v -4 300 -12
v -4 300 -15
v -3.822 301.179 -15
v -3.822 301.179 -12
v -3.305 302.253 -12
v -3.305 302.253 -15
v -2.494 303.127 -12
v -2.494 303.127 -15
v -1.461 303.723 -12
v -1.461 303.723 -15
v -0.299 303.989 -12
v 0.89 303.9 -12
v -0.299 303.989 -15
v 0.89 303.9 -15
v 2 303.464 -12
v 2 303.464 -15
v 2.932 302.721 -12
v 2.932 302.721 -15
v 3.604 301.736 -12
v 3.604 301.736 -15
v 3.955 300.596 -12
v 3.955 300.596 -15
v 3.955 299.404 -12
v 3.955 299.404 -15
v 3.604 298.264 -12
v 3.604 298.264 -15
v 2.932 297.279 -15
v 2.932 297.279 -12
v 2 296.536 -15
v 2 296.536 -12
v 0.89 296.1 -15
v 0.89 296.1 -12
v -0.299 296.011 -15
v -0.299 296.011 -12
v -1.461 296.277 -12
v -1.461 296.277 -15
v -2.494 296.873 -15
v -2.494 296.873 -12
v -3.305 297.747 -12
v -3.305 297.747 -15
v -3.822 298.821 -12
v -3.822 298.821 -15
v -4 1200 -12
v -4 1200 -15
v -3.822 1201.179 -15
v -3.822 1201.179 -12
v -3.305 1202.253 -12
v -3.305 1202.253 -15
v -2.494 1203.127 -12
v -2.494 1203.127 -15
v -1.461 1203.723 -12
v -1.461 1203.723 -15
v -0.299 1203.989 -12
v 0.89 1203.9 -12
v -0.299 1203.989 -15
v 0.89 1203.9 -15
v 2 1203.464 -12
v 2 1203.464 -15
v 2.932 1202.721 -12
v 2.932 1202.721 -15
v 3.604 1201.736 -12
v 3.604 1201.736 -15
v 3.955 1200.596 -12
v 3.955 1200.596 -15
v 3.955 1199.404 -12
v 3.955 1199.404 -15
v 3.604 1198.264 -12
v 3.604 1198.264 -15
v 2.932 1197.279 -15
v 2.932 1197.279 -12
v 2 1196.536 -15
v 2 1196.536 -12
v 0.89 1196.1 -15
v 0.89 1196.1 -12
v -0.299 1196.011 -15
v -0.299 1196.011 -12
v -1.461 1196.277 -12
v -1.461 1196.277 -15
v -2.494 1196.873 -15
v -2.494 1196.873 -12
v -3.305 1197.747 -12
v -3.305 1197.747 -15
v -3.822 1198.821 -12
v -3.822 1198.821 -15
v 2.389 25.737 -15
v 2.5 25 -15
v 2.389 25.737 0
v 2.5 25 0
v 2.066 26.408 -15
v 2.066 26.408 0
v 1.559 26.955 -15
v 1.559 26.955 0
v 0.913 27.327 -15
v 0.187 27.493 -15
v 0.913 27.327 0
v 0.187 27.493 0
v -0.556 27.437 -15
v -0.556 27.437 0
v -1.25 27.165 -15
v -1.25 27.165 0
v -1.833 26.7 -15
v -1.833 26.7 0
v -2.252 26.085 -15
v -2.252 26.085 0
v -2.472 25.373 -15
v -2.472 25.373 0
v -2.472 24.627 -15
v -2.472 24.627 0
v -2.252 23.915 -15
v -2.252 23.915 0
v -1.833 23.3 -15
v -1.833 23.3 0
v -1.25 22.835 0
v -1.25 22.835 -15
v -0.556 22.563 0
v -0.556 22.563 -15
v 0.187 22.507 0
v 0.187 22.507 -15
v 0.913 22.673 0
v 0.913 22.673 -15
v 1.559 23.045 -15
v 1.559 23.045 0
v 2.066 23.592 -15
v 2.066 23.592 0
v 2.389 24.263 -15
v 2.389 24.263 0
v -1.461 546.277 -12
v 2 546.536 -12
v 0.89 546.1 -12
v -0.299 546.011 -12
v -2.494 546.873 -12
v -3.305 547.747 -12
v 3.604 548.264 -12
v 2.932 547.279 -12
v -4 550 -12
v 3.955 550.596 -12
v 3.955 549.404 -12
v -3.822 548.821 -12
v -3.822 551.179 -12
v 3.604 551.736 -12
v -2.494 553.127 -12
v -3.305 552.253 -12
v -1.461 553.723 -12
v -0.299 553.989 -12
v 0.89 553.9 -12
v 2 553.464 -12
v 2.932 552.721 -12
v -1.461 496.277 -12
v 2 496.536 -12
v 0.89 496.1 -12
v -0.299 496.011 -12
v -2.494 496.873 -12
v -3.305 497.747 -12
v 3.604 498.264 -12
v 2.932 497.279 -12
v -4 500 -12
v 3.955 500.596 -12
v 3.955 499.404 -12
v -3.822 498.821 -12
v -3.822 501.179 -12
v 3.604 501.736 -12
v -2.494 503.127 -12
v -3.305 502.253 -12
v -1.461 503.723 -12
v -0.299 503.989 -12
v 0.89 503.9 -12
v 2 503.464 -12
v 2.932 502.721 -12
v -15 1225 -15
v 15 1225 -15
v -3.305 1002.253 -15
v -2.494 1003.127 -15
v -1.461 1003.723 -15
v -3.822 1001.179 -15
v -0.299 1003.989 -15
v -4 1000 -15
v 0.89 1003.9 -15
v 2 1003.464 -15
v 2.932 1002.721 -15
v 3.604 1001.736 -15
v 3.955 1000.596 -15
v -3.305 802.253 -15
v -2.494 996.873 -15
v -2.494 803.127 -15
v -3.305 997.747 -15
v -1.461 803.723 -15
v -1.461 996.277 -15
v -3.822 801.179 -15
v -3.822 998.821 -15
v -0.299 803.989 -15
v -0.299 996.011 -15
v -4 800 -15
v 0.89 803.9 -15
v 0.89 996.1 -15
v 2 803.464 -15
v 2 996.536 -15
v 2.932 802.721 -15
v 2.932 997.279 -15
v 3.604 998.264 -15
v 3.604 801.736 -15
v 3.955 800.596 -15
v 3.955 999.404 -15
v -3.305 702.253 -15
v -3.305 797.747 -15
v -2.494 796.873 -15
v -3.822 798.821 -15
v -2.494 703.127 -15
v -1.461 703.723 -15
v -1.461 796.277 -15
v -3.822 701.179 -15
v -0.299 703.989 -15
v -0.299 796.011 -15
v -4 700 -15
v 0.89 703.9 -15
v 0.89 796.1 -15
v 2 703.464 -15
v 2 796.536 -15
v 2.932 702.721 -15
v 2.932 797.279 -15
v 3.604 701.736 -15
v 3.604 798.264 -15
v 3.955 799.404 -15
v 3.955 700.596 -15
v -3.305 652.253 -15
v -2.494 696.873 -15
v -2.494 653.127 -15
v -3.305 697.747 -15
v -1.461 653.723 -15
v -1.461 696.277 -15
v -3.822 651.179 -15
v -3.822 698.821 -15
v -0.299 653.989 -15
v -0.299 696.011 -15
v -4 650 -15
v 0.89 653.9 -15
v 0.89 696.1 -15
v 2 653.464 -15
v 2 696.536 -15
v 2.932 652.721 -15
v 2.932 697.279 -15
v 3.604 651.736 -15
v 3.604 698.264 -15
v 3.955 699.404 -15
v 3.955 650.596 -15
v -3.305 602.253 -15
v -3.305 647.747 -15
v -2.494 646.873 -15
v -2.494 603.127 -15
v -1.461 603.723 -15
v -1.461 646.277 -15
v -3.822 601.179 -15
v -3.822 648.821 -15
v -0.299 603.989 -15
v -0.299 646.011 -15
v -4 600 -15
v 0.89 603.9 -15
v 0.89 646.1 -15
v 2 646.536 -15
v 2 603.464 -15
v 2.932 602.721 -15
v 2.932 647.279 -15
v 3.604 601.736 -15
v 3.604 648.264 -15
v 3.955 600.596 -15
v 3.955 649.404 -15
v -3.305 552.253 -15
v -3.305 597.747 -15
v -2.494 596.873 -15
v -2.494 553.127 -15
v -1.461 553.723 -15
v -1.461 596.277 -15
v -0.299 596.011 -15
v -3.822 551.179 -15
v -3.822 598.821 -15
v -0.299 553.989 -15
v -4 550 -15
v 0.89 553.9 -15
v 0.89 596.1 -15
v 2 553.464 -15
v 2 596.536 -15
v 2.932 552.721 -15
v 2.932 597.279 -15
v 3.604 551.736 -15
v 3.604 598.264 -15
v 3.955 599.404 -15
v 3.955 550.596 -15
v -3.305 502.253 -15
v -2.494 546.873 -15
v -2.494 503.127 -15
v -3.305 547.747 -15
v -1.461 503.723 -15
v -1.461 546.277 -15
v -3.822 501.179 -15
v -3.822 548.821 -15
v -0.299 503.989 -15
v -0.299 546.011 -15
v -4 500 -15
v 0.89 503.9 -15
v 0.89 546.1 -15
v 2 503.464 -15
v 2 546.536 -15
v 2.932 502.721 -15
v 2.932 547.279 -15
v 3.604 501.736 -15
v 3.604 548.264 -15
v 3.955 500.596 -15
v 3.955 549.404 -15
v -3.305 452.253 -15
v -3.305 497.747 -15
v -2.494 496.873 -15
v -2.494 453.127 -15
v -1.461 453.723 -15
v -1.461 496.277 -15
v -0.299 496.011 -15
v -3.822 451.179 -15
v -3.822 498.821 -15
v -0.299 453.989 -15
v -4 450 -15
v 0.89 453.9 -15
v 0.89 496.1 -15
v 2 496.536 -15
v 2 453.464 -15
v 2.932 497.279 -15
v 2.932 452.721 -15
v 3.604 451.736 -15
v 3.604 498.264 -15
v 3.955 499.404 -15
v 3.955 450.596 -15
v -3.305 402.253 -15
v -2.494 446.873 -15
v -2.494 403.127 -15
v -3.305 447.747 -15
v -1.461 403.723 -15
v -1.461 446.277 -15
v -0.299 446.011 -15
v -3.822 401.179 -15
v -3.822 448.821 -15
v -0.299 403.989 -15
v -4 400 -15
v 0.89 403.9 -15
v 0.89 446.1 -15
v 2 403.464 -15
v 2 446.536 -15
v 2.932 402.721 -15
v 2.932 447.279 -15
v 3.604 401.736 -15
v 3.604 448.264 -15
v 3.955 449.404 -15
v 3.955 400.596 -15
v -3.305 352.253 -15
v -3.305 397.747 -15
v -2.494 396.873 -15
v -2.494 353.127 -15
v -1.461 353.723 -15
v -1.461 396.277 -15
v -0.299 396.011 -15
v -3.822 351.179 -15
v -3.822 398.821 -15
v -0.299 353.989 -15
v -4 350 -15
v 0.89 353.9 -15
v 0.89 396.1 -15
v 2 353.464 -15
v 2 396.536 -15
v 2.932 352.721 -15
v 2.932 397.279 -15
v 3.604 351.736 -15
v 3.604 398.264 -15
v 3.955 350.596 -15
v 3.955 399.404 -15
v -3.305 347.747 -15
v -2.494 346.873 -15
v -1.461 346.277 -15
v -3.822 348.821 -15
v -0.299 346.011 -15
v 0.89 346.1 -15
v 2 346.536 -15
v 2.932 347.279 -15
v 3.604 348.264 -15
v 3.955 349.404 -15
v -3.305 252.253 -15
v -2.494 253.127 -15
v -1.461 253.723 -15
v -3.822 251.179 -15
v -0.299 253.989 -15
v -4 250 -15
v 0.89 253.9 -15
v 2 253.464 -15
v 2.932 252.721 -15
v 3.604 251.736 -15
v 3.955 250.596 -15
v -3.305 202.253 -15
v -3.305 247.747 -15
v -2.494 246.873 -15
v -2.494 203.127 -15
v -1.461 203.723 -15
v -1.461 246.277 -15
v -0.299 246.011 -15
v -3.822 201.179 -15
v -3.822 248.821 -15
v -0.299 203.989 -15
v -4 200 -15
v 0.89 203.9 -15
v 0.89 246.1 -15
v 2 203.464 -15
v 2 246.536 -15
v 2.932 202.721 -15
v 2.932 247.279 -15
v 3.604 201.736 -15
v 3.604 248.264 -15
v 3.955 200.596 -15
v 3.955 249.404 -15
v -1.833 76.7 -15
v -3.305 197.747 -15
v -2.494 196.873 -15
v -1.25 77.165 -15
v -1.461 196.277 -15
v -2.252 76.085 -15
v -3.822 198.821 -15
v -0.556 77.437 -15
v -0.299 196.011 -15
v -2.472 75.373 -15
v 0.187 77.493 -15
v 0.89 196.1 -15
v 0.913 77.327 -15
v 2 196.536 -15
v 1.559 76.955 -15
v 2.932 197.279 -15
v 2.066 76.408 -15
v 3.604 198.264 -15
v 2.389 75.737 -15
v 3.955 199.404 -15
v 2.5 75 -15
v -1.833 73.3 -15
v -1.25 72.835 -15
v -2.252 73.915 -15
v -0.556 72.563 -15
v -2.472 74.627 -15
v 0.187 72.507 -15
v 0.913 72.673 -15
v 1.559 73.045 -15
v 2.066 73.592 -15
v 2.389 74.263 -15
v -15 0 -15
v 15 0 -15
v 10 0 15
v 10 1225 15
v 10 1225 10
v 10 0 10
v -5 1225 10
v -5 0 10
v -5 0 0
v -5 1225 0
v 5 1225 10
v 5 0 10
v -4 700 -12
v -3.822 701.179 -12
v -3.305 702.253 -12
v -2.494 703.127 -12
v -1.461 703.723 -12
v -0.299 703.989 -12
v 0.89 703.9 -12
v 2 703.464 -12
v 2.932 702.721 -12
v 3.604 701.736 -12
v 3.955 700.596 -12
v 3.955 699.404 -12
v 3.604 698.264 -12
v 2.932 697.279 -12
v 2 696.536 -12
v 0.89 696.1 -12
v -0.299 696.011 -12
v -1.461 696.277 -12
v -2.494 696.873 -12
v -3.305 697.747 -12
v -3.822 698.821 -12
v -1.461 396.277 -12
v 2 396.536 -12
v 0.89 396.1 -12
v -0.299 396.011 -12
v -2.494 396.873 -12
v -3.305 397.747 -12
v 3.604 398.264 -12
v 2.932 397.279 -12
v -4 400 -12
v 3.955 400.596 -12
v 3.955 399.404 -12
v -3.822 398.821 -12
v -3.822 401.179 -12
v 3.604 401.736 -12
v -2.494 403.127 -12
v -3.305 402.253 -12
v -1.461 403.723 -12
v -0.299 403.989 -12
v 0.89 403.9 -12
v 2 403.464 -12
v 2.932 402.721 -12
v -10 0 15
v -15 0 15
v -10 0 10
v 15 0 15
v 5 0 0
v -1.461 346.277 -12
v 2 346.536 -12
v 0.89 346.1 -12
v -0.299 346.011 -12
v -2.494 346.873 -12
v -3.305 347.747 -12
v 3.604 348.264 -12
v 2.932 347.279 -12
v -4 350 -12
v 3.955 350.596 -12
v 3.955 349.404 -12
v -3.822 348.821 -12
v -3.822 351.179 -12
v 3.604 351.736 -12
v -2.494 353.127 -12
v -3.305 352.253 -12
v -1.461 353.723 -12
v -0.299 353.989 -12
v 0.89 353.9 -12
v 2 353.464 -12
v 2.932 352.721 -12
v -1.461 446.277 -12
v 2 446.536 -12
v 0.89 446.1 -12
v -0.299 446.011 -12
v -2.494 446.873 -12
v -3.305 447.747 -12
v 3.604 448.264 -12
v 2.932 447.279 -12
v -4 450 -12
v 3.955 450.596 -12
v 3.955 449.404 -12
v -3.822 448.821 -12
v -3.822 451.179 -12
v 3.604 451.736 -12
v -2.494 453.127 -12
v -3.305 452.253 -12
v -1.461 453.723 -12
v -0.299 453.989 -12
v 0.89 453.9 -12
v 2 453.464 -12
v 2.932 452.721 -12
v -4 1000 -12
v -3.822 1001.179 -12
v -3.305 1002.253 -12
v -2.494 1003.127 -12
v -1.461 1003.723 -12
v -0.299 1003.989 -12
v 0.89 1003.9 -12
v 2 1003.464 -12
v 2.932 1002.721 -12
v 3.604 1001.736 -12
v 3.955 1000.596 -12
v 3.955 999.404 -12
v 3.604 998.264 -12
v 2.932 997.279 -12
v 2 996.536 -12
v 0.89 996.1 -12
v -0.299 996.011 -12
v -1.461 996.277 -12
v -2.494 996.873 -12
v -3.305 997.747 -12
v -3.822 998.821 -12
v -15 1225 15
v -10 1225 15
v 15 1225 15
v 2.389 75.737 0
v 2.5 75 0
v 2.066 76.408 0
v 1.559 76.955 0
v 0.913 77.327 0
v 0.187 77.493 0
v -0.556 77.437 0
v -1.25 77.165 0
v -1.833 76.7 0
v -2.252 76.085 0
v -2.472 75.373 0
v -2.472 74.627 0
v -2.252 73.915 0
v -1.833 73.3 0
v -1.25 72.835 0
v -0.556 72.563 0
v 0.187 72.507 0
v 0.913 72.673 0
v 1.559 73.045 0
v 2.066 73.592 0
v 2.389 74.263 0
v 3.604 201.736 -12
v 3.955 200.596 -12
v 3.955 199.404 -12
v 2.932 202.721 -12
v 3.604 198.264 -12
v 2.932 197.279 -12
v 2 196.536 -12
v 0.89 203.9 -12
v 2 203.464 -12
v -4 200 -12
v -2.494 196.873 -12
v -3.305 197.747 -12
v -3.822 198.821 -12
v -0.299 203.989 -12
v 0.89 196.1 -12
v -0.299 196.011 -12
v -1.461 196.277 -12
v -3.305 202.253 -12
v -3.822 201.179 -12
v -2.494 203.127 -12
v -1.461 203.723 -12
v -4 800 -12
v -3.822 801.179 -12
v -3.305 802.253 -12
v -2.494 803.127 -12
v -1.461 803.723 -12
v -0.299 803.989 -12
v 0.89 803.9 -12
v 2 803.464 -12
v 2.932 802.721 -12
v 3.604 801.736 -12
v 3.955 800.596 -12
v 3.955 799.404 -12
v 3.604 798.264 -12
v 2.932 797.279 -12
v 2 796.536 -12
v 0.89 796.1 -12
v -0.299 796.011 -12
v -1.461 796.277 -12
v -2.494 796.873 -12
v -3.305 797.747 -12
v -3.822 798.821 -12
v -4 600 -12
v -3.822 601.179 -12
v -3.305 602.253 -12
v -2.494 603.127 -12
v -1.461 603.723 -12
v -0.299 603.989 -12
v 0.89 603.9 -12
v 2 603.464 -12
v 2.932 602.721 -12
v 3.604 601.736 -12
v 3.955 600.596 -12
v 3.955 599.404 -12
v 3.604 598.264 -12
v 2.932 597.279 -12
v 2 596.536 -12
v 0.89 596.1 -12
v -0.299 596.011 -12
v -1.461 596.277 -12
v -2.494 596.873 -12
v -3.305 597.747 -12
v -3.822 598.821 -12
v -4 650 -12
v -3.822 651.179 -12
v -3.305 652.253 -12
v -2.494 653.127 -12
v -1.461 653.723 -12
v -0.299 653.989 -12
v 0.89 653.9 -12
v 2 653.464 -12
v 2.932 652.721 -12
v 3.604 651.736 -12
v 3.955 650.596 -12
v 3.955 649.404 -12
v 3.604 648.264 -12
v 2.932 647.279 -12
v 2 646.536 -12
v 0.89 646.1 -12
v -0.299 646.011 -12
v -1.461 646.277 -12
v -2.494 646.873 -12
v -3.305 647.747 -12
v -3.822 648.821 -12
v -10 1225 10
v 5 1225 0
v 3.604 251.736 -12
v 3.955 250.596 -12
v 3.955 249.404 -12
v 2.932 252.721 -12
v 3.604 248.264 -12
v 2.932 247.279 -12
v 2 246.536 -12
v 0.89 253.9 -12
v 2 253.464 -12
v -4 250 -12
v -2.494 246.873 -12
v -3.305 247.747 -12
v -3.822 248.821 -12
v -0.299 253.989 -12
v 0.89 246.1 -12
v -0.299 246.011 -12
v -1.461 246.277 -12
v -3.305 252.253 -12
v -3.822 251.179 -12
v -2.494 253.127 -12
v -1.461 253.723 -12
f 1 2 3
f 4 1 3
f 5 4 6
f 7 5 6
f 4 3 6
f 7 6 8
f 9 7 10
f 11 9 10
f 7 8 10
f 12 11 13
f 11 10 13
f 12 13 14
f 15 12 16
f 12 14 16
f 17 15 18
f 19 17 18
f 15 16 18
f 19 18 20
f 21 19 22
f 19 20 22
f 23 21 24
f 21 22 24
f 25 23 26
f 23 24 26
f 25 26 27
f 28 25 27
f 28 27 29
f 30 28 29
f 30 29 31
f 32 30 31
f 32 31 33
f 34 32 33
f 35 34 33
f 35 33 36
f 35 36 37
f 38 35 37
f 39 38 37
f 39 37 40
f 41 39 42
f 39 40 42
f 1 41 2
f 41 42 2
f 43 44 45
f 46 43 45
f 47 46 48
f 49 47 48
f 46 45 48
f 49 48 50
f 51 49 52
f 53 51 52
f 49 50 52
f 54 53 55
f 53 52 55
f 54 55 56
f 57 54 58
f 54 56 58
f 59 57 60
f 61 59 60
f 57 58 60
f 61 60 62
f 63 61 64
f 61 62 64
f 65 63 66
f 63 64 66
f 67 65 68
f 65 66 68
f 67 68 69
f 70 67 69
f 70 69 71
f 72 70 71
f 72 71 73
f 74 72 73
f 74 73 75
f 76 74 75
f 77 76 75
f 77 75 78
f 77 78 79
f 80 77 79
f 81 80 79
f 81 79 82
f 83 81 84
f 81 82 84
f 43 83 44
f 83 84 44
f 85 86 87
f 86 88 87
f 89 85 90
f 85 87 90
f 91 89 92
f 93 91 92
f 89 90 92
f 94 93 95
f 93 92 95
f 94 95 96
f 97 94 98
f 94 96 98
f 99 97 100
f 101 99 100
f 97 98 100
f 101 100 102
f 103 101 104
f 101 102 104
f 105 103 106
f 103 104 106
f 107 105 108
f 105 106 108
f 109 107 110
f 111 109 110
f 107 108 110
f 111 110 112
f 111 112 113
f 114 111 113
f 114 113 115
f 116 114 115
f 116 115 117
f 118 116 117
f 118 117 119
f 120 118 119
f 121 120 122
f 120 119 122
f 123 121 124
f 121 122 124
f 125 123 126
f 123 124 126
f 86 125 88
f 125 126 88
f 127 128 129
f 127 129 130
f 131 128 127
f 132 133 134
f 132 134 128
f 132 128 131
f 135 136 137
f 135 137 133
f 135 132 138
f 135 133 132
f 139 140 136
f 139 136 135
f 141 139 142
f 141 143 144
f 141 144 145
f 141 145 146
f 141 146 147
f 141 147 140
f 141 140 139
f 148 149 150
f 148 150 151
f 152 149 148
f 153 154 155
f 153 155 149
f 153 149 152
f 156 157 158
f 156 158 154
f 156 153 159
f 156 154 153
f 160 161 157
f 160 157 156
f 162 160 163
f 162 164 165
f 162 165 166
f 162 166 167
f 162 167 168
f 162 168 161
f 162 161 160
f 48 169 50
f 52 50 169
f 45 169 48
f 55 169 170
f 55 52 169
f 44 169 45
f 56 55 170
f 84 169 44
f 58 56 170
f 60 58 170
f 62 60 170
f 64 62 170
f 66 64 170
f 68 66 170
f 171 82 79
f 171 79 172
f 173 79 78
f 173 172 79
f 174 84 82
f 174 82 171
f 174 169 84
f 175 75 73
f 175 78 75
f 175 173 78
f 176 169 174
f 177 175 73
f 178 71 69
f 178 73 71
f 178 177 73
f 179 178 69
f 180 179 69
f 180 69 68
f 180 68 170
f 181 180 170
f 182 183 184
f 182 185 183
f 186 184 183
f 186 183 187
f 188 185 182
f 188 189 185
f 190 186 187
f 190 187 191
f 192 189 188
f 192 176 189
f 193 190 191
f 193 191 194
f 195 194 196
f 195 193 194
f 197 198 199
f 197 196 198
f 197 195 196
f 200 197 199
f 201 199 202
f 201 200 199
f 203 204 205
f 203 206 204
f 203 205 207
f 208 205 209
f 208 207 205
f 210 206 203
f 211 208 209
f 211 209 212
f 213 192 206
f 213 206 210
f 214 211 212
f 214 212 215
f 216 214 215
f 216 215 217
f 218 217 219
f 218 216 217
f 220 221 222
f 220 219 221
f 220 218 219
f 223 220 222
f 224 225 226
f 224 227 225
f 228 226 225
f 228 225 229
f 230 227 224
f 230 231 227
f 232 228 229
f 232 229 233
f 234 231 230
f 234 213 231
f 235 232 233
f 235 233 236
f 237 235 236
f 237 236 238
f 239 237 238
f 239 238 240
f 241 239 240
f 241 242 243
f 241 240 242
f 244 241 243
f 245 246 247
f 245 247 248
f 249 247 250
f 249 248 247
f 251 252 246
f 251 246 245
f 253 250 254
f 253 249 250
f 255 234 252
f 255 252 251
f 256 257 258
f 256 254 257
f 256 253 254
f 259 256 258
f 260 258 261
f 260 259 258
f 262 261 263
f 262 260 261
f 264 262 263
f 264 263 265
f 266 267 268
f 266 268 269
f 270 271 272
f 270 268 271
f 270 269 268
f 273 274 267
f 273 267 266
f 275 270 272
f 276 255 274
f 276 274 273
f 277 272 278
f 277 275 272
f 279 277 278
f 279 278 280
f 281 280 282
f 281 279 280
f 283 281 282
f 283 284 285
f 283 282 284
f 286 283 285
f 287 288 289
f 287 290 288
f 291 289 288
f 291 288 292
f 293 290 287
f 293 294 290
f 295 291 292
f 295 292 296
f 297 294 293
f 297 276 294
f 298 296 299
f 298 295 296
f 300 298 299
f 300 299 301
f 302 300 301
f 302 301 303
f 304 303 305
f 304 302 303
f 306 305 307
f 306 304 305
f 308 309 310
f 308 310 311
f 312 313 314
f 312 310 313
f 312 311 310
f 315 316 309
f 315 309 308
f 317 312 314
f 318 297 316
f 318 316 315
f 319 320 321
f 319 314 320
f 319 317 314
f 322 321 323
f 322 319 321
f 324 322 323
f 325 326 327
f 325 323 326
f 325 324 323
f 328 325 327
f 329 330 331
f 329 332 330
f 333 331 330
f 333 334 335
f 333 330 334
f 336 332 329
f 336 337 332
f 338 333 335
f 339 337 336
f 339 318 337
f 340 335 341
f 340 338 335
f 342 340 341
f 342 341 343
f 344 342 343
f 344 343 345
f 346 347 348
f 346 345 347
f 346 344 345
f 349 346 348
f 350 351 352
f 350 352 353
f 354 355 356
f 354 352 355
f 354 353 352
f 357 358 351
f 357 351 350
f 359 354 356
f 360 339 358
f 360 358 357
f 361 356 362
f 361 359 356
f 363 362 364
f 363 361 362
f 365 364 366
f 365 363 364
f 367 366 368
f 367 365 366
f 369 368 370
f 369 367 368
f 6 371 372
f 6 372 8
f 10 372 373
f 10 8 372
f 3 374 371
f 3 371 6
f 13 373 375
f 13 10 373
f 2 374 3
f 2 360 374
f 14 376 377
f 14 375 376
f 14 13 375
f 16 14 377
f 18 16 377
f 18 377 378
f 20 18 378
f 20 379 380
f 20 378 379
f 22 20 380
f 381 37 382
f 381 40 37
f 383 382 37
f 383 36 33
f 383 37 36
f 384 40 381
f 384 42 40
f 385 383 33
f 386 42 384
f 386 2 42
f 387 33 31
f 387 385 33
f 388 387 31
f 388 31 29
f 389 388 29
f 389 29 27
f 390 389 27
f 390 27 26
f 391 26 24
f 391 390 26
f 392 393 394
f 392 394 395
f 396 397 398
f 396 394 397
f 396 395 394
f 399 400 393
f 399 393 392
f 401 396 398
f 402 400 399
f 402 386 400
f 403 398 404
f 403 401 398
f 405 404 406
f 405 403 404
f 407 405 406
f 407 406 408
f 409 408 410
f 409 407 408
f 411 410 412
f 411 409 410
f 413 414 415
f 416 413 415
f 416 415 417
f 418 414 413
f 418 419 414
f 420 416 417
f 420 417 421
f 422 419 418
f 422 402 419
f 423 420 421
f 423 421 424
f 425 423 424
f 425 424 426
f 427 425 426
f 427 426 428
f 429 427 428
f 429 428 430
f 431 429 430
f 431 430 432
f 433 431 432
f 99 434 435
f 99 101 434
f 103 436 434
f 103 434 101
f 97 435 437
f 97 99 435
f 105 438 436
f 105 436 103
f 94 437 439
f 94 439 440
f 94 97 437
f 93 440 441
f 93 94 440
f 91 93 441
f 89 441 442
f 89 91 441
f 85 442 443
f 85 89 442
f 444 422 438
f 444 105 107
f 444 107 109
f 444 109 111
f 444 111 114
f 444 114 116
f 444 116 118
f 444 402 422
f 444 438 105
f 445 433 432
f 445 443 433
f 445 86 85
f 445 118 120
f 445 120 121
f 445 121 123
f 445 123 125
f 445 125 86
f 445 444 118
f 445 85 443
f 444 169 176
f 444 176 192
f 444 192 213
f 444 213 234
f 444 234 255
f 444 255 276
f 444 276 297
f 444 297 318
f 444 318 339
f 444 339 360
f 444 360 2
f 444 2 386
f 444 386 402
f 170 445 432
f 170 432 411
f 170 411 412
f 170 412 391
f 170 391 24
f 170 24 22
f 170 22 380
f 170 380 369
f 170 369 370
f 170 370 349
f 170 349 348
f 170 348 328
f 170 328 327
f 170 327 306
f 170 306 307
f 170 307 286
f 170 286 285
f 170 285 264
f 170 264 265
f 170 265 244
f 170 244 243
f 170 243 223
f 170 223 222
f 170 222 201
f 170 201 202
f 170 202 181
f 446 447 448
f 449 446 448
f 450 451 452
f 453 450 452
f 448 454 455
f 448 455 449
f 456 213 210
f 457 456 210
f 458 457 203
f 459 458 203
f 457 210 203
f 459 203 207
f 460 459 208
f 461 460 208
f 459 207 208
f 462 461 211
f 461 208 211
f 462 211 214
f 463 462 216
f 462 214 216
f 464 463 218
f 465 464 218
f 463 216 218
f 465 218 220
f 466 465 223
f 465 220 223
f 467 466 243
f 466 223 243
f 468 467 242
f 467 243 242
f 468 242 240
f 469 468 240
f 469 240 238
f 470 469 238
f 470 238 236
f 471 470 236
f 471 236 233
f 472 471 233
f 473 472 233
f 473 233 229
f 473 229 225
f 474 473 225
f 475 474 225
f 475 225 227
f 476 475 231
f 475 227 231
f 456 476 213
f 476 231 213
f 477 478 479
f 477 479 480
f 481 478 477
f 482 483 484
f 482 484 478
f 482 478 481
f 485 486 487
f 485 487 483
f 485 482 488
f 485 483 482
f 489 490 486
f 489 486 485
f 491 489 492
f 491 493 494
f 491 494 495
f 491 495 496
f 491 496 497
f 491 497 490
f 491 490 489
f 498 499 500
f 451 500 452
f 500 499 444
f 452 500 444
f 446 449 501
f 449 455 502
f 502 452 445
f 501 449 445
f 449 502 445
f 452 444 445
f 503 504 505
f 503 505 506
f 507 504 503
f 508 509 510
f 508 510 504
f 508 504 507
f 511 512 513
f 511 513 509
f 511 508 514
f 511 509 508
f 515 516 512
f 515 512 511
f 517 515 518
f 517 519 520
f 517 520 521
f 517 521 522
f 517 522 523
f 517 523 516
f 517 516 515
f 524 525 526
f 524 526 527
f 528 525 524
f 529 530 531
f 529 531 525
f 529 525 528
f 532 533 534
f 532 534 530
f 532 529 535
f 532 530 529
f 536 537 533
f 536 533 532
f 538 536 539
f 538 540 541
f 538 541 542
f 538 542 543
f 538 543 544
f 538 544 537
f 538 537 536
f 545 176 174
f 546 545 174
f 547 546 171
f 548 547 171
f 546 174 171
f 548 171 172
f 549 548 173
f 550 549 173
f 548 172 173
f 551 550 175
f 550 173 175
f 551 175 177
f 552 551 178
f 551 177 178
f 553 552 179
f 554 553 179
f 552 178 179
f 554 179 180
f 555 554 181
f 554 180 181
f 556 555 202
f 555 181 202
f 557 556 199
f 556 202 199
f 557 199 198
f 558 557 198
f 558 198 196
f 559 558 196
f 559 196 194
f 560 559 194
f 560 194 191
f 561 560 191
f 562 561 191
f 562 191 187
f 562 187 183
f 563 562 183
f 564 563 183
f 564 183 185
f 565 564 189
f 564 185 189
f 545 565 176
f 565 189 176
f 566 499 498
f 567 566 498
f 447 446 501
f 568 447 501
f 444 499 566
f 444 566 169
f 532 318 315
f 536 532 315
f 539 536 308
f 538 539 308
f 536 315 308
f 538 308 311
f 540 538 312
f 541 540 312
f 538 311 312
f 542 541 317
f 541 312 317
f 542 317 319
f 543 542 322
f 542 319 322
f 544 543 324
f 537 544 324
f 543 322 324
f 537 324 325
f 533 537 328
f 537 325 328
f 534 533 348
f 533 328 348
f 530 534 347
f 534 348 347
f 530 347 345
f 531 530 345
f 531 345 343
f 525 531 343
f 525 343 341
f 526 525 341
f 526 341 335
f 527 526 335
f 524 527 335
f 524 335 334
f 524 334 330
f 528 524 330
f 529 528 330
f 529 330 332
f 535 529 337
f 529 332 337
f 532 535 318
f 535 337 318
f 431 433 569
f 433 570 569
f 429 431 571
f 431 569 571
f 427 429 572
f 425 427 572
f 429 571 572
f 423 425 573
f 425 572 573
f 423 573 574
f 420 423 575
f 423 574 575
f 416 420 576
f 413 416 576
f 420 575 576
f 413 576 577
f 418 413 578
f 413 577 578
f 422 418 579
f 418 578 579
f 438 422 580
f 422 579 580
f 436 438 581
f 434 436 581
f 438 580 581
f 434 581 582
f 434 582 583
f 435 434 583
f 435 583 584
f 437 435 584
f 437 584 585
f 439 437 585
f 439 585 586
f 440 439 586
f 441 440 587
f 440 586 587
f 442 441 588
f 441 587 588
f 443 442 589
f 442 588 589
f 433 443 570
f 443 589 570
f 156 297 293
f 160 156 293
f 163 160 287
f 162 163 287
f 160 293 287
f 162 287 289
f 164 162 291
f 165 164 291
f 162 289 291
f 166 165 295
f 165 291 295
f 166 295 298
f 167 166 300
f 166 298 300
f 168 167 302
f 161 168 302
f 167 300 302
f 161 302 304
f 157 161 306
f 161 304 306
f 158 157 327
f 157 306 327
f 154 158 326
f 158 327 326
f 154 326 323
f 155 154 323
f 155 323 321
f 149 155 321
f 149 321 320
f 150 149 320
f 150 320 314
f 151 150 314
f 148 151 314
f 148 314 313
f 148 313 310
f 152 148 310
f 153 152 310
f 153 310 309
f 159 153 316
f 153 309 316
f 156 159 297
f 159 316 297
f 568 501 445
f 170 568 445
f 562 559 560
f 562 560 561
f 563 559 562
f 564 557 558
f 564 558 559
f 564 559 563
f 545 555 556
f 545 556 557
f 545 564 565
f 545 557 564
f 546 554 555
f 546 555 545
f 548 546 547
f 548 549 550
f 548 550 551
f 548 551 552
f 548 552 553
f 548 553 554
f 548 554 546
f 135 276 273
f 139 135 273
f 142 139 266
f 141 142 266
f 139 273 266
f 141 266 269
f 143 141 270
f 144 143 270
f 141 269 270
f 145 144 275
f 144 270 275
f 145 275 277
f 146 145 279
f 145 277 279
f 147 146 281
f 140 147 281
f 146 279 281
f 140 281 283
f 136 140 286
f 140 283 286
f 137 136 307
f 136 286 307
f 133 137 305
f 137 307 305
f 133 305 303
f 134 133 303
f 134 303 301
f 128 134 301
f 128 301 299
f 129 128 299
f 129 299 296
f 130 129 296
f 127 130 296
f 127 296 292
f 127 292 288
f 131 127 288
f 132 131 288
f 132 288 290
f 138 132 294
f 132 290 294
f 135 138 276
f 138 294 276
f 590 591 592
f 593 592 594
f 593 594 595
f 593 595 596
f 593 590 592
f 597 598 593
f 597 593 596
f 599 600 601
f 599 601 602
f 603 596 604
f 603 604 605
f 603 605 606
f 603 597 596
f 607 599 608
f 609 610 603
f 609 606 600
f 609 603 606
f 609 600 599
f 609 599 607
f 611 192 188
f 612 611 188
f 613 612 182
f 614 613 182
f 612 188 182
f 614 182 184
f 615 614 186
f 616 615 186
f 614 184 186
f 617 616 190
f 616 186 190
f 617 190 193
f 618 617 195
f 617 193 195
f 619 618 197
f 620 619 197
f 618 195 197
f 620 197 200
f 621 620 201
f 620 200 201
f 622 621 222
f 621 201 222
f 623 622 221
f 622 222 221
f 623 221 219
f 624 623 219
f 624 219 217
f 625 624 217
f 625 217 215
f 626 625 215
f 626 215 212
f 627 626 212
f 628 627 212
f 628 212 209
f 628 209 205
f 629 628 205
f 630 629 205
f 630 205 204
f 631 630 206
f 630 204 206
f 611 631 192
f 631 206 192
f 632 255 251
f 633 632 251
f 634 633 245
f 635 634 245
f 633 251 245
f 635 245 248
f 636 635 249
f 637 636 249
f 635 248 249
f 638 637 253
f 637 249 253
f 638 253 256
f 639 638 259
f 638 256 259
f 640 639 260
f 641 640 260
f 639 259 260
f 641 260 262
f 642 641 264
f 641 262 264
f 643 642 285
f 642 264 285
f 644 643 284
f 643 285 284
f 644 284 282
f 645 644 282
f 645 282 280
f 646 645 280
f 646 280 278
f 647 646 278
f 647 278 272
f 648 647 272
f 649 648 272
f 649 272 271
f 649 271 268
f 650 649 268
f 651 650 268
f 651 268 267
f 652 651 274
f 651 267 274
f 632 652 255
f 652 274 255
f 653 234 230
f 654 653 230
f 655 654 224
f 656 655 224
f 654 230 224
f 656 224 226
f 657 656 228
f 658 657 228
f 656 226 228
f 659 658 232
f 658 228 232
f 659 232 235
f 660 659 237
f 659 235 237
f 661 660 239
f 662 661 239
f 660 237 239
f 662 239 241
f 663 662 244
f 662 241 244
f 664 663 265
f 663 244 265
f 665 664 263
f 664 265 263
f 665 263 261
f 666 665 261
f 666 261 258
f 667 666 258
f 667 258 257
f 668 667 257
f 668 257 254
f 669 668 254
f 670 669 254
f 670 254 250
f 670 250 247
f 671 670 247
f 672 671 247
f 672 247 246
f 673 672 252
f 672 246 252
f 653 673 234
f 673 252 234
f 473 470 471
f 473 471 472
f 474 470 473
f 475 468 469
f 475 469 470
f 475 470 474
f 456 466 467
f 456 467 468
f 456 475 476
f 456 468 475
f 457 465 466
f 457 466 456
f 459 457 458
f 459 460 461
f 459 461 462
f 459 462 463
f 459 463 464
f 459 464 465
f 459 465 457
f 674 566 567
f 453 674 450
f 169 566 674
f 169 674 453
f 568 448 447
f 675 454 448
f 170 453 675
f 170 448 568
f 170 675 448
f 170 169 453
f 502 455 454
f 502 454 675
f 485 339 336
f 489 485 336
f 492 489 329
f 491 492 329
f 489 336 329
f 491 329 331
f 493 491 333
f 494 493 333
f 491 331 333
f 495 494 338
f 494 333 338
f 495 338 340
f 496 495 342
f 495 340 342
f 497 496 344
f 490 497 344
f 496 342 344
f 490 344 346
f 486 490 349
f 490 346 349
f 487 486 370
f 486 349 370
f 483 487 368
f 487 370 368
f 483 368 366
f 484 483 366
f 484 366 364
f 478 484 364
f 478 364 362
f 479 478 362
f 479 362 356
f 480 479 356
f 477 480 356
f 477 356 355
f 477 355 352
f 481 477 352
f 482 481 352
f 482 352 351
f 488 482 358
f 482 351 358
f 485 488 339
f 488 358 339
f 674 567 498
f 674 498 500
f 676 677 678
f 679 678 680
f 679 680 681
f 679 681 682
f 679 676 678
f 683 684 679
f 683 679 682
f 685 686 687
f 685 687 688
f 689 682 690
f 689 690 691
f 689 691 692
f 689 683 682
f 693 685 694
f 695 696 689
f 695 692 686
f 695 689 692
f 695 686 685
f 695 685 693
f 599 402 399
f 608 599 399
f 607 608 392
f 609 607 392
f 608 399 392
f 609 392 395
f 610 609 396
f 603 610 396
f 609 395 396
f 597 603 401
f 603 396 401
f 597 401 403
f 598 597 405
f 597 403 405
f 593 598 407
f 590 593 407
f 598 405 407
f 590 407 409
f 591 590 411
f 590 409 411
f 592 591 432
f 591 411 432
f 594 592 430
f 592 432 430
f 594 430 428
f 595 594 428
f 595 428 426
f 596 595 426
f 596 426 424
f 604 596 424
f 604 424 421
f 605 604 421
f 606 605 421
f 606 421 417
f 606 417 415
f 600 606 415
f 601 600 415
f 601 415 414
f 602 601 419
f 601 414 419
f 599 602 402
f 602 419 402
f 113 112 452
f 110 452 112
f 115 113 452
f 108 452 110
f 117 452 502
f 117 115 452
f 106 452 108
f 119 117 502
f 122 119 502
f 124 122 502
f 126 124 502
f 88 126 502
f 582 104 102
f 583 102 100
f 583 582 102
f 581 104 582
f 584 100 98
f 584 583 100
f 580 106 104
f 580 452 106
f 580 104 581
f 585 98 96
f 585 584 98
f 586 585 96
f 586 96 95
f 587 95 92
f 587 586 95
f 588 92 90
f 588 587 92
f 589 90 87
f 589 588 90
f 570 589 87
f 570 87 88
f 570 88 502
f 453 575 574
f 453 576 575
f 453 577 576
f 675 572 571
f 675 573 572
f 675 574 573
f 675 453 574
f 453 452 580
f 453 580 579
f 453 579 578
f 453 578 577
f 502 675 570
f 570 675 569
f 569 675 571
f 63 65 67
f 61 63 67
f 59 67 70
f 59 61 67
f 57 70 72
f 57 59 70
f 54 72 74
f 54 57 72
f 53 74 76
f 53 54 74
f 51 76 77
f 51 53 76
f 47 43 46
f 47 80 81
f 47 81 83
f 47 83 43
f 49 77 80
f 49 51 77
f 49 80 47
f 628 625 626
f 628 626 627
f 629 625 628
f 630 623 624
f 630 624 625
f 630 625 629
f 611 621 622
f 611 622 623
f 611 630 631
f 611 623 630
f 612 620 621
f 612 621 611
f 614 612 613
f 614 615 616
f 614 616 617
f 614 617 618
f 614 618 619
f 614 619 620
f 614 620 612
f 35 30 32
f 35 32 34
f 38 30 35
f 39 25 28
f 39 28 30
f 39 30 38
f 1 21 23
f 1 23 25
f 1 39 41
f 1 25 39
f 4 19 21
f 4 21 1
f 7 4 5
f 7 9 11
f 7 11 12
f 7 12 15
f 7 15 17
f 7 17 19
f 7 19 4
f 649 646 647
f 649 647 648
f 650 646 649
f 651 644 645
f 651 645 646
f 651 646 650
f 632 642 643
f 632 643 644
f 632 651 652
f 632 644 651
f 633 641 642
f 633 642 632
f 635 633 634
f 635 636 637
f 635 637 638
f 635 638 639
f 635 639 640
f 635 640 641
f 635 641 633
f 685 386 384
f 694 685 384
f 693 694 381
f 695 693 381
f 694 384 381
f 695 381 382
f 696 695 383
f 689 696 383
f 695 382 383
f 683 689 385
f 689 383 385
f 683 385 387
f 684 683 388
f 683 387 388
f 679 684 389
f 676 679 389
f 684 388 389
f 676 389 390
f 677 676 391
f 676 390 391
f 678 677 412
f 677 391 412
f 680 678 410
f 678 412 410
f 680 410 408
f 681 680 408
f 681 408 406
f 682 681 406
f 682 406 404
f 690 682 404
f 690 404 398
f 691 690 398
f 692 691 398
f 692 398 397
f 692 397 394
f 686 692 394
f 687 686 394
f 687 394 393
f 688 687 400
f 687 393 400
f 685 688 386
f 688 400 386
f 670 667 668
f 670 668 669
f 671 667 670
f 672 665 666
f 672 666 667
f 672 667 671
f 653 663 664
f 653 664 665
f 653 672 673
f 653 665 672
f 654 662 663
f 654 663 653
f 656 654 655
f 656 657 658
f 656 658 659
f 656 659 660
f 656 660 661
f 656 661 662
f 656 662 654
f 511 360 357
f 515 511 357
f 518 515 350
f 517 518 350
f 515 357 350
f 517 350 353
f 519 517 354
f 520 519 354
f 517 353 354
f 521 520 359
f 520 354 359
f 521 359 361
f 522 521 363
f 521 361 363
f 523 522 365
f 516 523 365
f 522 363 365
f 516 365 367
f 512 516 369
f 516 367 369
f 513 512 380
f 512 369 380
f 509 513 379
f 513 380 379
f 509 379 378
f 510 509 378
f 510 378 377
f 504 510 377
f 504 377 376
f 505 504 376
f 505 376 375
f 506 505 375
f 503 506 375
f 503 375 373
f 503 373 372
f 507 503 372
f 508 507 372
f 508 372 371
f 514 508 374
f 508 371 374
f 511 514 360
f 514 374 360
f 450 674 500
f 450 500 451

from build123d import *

# Parameters (mm, degrees)
SKETCH1_W                 = 30
SKETCH1_H                 = 30
BOSS_EXTRUDE1_DEPTH       = 1225
CUT_EXTRUDE1_REACH        = 1227
SKETCH2_W                 = 20
SKETCH2_H                 = 5
CUT_EXTRUDE2_REACH        = 1227
SKETCH3_W                 = 10
SKETCH3_H                 = 10
SKETCH6_R                 = 4
CUT_EXTRUDE3_DEPTH        = 3
M6X1_0_TAPPED_HOLE1_D     = 5
M6X1_0_TAPPED_HOLE1_DEPTH = 15
M6X1_0_TAPPED_HOLE1_TIP   = 1.502151548


with BuildPart() as part:
    # Sketch1 → Boss-Extrude1 (new body)
    with BuildSketch(Plane(origin=(0, 0, 0), x_dir=(1, 0, 0), z_dir=(0, 1, 0))):
        Rectangle(SKETCH1_W, SKETCH1_H)
    extrude(amount=BOSS_EXTRUDE1_DEPTH)

    # Sketch2 → Cut-Extrude1 (cut, up to next)
    with BuildSketch(Plane(origin=(0, 1225, 0), x_dir=(1, 0, 0), z_dir=(0, 1, 0)), mode=Mode.PRIVATE) as cut_extrude1_sk1:
        with Locations((0, -12.5)):
            Rectangle(SKETCH2_W, SKETCH2_H)
    cut_extrude1_tool1 = extrude(cut_extrude1_sk1.sketch, amount=-CUT_EXTRUDE1_REACH, mode=Mode.PRIVATE) & part.part
    add(cut_extrude1_tool1.solids().sort_by_distance((0, 1225, 12.5))[0], mode=Mode.SUBTRACT)

    # Sketch3 → Cut-Extrude2 (cut, up to next)
    with BuildSketch(Plane(origin=(0, 1225, 0), x_dir=(1, 0, 0), z_dir=(0, 1, 0)), mode=Mode.PRIVATE) as cut_extrude2_sk1:
        with Locations((0, -5)):
            Rectangle(SKETCH3_W, SKETCH3_H)
    cut_extrude2_tool1 = extrude(cut_extrude2_sk1.sketch, amount=-CUT_EXTRUDE2_REACH, mode=Mode.PRIVATE) & part.part
    add(cut_extrude2_tool1.solids().sort_by_distance((0, 1225, 5))[0], mode=Mode.SUBTRACT)

    # Sketch6 → Cut-Extrude3 (cut)
    with BuildSketch(Plane(origin=(0, 0, -15), x_dir=(-1, 0, 0), z_dir=(0, 0, -1))):
        with Locations((0, 1200)):
            Circle(SKETCH6_R)
        with Locations((0, 1000)):
            Circle(SKETCH6_R)
        with Locations((0, 800)):
            Circle(SKETCH6_R)
        with Locations((0, 700)):
            Circle(SKETCH6_R)
        with Locations((0, 650)):
            Circle(SKETCH6_R)
        with Locations((0, 600)):
            Circle(SKETCH6_R)
        with Locations((0, 550)):
            Circle(SKETCH6_R)
        with Locations((0, 500)):
            Circle(SKETCH6_R)
        with Locations((0, 450)):
            Circle(SKETCH6_R)
        with Locations((0, 400)):
            Circle(SKETCH6_R)
        with Locations((0, 350)):
            Circle(SKETCH6_R)
        with Locations((0, 300)):
            Circle(SKETCH6_R)
        with Locations((0, 250)):
            Circle(SKETCH6_R)
        with Locations((0, 200)):
            Circle(SKETCH6_R)
    extrude(amount=-CUT_EXTRUDE3_DEPTH, mode=Mode.SUBTRACT)

    # M6x1.0 Tapped Hole1
    with Locations(Plane(origin=(0, 0, -15), x_dir=(-1, 0, 0), z_dir=(0, 0, -1))):
        with Locations((0, 75), (0, 25)):
            Hole(M6X1_0_TAPPED_HOLE1_D / 2, depth=M6X1_0_TAPPED_HOLE1_DEPTH)
            with Locations((0, 0, -(M6X1_0_TAPPED_HOLE1_DEPTH + M6X1_0_TAPPED_HOLE1_TIP / 2))):  # 118° drill point
                Cone(0, M6X1_0_TAPPED_HOLE1_D / 2, M6X1_0_TAPPED_HOLE1_TIP, mode=Mode.SUBTRACT)


solid = part.part
